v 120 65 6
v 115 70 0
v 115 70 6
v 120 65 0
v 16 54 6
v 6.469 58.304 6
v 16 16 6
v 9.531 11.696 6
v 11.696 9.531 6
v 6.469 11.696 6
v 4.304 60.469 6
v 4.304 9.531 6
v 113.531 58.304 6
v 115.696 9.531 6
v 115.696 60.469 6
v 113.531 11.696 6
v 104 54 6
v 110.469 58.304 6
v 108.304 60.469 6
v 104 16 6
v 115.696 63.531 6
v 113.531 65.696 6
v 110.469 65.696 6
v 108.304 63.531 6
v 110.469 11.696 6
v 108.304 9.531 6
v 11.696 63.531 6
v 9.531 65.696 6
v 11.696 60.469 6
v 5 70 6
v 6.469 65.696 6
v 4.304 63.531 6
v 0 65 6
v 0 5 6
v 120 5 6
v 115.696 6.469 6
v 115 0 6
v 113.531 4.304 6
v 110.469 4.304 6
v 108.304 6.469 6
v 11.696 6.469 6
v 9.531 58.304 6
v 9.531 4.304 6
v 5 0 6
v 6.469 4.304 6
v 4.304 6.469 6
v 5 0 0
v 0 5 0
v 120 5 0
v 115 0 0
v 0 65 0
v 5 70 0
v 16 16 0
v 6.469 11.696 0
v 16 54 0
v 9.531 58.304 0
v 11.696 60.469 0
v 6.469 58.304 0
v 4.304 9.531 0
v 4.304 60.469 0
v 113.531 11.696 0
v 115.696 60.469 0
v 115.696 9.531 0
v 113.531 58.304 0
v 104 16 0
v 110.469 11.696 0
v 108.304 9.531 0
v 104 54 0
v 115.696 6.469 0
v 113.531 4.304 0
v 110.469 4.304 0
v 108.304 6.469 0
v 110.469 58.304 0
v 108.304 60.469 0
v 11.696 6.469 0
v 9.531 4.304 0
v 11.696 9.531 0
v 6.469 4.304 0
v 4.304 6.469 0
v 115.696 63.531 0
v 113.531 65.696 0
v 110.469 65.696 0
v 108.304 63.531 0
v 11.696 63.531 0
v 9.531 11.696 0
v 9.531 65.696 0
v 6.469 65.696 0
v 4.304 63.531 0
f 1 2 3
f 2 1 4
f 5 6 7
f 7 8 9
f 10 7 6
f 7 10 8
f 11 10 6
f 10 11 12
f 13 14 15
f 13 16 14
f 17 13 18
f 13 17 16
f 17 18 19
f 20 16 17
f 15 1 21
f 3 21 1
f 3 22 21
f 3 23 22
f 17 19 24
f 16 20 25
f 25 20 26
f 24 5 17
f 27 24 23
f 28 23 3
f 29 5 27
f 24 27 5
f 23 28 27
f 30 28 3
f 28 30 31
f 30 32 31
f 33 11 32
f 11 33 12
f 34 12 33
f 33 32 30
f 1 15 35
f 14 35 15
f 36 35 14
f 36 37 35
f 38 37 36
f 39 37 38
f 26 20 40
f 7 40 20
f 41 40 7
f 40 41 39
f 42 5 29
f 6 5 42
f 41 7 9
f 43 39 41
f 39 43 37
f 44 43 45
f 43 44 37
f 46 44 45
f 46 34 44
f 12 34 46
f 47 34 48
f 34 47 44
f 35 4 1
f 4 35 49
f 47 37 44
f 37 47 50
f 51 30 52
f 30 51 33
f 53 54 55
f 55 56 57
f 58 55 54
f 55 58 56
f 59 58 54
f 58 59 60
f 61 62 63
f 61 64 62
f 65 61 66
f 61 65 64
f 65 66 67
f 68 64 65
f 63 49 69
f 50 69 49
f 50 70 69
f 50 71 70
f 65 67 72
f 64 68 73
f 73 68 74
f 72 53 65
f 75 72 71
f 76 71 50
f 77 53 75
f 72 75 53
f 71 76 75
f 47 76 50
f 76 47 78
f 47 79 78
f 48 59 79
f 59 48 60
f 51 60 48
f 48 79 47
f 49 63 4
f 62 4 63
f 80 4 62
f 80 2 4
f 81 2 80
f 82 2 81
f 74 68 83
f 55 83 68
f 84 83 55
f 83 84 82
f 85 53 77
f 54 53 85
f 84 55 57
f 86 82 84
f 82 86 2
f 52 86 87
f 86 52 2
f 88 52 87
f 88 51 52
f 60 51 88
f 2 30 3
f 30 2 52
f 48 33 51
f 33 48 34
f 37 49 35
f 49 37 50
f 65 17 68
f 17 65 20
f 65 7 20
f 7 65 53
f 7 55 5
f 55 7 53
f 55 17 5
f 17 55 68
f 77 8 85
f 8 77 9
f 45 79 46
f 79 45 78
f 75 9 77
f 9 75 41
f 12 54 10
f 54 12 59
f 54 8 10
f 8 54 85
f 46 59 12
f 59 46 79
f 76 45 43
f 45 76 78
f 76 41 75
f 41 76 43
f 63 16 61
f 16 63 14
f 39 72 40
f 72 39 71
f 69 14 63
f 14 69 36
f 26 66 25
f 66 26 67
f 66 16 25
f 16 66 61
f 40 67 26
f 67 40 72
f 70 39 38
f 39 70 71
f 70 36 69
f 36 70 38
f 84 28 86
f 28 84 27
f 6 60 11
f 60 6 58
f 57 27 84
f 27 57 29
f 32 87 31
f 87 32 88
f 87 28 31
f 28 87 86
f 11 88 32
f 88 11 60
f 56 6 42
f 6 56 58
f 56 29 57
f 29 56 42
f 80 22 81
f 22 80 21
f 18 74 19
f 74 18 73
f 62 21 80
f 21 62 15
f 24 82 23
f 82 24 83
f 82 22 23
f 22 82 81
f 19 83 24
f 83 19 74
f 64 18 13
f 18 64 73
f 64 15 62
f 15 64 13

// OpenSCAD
$fn = 32;

// ----------------------------------------------------------------------
// Frame plate: 120 x 70 frame, 16 mm rails
// ----------------------------------------------------------------------

// --- parameters (mm) ---
plate_l = 120;            // plate length, X
plate_w = 70;             // plate width, Y
plate_t = 6;              // plate thickness, Z (extrusion height)
corner_c = 5;             // corner chamfer
frame_bar = 16;           // frame rail width
bolt_r = 4;               // corner bolt window radius
bolt_inset = 8;           // bolt centre inset from the edges

win_l = plate_l - 2 * frame_bar;  // window length
win_w = plate_w - 2 * frame_bar;  // window width
bolt_d = 2 * bolt_r;  // corner hole diameter

profile = [[5, 0], [115, 0], [120, 5], [120, 65], [115, 70], [5, 70], [0, 65], [0, 5]];  // primary outline, 8 points, counter clockwise
void_1 = [[16, 16], [104, 16], [104, 54], [16, 54]];  // the window, 4 points
void_2 = [[11.696, 9.531], [9.531, 11.696], [6.469, 11.696], [4.304, 9.531], [4.304, 6.469], [6.469, 4.304], [9.531, 4.304], [11.696, 6.469]];  // corner bolt window, 8 points
void_3 = [[115.696, 9.531], [113.531, 11.696], [110.469, 11.696], [108.304, 9.531], [108.304, 6.469], [110.469, 4.304], [113.531, 4.304], [115.696, 6.469]];  // corner bolt window, 8 points
void_4 = [[11.696, 63.531], [9.531, 65.696], [6.469, 65.696], [4.304, 63.531], [4.304, 60.469], [6.469, 58.304], [9.531, 58.304], [11.696, 60.469]];  // corner bolt window, 8 points
void_5 = [[115.696, 63.531], [113.531, 65.696], [110.469, 65.696], [108.304, 63.531], [108.304, 60.469], [110.469, 58.304], [113.531, 58.304], [115.696, 60.469]];  // corner bolt window, 8 points

// --- the one profile operation ---
difference() {
  linear_extrude(height = plate_t) polygon(points = profile);
  translate([0, 0, -1])
    linear_extrude(height = plate_t + 2) polygon(points = void_1);
  translate([0, 0, -1])
    linear_extrude(height = plate_t + 2) polygon(points = void_2);
  translate([0, 0, -1])
    linear_extrude(height = plate_t + 2) polygon(points = void_3);
  translate([0, 0, -1])
    linear_extrude(height = plate_t + 2) polygon(points = void_4);
  translate([0, 0, -1])
    linear_extrude(height = plate_t + 2) polygon(points = void_5);
}
